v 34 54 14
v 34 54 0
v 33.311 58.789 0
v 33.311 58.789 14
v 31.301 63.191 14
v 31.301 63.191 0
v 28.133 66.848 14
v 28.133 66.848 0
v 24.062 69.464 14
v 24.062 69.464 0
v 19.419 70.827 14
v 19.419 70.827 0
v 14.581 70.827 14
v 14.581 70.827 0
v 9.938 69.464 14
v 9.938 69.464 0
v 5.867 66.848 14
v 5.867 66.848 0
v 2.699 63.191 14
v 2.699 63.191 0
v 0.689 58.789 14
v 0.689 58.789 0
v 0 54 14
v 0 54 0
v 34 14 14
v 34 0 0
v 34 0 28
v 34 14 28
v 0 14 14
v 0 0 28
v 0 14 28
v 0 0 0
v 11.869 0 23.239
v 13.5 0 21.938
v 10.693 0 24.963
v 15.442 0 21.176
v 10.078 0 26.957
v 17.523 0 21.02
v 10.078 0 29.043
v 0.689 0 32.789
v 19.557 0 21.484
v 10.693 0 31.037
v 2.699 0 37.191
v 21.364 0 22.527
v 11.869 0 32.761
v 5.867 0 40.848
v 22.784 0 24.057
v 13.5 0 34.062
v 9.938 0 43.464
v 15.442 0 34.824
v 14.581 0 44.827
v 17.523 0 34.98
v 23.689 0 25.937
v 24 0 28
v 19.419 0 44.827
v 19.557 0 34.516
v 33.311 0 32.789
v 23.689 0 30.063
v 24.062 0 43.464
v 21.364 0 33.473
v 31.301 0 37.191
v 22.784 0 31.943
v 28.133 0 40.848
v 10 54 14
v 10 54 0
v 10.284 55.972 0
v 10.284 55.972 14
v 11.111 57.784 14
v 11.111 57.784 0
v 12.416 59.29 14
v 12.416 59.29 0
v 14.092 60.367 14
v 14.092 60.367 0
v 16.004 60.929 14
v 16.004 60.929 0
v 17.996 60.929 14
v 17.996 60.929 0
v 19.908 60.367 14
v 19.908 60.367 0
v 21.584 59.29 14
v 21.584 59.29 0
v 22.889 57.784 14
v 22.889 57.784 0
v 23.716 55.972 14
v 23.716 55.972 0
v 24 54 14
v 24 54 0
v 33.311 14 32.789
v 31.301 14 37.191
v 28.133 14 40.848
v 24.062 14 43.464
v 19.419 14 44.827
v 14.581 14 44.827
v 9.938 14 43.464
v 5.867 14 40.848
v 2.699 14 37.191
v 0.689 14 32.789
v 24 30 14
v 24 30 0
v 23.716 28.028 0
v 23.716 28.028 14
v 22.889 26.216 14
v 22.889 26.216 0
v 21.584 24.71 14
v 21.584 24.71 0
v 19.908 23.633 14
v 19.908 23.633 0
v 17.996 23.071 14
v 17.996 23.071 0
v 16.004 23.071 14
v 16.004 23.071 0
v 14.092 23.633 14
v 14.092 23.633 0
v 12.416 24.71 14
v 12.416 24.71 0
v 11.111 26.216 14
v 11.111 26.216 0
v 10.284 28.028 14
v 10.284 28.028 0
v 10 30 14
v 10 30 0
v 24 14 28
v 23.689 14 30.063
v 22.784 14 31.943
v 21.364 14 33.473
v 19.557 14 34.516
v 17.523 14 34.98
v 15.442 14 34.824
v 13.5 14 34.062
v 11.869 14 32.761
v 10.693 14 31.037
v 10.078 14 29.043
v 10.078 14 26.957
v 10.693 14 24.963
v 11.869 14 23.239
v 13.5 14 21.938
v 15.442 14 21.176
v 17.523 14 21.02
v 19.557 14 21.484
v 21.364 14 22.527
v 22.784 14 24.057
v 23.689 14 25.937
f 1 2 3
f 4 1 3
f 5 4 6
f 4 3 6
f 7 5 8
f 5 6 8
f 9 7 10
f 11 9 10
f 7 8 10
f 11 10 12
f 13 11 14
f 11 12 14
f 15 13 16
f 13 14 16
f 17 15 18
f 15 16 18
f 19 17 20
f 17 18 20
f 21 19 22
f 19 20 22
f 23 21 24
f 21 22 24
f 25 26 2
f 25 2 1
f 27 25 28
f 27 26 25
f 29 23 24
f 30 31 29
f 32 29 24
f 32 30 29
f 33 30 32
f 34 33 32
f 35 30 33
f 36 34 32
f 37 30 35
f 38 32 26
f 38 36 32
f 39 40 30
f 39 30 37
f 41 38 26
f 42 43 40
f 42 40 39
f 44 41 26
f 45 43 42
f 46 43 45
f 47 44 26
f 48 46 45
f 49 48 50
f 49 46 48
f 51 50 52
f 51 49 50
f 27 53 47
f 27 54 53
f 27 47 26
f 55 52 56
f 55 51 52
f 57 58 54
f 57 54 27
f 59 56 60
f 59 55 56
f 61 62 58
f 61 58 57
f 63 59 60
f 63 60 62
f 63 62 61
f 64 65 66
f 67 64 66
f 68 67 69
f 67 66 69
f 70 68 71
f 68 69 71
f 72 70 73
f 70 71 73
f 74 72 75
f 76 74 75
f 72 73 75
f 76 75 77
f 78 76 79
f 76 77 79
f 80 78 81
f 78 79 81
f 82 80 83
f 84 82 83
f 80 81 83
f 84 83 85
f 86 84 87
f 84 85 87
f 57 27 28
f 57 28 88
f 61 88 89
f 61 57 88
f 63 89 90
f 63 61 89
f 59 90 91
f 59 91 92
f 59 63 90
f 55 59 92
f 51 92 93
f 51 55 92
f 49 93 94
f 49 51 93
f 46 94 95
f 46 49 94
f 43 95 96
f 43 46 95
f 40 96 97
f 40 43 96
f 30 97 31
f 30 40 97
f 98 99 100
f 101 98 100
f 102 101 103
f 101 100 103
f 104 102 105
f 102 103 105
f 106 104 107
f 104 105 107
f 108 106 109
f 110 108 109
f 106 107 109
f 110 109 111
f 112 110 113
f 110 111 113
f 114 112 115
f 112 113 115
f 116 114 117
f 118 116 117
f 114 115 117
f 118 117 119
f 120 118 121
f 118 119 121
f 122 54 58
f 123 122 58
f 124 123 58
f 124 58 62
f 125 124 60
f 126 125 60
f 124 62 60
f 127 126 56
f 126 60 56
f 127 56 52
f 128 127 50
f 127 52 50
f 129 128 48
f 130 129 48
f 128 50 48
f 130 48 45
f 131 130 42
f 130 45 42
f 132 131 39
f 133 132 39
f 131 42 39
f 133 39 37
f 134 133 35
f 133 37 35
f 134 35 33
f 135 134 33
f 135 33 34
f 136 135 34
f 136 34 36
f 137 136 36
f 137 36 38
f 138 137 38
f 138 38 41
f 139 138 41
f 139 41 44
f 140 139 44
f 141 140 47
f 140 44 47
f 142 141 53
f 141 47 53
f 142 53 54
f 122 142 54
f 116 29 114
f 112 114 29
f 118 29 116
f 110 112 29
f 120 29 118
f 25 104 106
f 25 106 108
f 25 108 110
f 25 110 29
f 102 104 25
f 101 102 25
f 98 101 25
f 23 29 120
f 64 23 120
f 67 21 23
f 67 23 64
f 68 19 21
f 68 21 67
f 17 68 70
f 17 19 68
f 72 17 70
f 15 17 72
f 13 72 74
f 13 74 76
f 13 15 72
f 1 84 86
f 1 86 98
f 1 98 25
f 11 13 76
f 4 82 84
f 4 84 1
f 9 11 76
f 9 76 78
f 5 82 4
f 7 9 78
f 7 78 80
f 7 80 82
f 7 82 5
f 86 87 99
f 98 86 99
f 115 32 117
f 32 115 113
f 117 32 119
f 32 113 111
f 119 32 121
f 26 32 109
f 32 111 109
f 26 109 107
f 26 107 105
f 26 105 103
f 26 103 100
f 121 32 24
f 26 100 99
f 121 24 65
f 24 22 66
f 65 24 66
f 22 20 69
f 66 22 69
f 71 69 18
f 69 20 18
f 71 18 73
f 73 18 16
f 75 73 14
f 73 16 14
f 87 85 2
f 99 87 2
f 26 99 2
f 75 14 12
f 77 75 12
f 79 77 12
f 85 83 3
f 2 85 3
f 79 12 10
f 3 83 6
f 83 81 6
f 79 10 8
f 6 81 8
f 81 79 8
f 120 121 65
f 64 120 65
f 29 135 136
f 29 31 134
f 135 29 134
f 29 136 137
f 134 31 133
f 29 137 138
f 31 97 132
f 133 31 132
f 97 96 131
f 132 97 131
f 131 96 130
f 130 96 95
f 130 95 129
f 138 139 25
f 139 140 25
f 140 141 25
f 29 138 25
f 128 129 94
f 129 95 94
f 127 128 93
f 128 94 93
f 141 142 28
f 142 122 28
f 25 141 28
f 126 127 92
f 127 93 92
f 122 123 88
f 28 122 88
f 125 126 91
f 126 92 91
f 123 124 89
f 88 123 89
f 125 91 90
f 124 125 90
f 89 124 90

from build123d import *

# Parameters (mm, degrees)
F1_DEPTH = 14
F2_R     = 7
F3_DEPTH = 14


with BuildPart() as f1:
    # F0 (on Top) → F1 (new body)
    with BuildSketch(Plane.XY):
        with BuildLine():
            Line((0, 54), (0, 0))
            Line((0, 0), (34, 0))
            Line((34, 0), (34, 54))
            ThreePointArc((34, 54), (17, 71), (0, 54))
        make_face()
        with BuildLine():
            ThreePointArc((10, 54), (17, 61), (24, 54))
            Line((24, 54), (24, 30))
            ThreePointArc((24, 30), (17, 23), (10, 30))
            Line((10, 30), (10, 54))
        make_face(mode=Mode.SUBTRACT)
    extrude(amount=F1_DEPTH)

    # F2 (on face) → F3 (join)
    with BuildSketch(Plane.XZ):
        with BuildLine():
            Line((0, 28), (0, 14))
            Line((0, 14), (34, 14))
            Line((34, 14), (34, 28))
            ThreePointArc((34, 28), (17, 45), (0, 28))
        make_face()
        with Locations((17, 28)):
            Circle(F2_R, mode=Mode.SUBTRACT)
    extrude(amount=-F3_DEPTH)


solid = f1.part
